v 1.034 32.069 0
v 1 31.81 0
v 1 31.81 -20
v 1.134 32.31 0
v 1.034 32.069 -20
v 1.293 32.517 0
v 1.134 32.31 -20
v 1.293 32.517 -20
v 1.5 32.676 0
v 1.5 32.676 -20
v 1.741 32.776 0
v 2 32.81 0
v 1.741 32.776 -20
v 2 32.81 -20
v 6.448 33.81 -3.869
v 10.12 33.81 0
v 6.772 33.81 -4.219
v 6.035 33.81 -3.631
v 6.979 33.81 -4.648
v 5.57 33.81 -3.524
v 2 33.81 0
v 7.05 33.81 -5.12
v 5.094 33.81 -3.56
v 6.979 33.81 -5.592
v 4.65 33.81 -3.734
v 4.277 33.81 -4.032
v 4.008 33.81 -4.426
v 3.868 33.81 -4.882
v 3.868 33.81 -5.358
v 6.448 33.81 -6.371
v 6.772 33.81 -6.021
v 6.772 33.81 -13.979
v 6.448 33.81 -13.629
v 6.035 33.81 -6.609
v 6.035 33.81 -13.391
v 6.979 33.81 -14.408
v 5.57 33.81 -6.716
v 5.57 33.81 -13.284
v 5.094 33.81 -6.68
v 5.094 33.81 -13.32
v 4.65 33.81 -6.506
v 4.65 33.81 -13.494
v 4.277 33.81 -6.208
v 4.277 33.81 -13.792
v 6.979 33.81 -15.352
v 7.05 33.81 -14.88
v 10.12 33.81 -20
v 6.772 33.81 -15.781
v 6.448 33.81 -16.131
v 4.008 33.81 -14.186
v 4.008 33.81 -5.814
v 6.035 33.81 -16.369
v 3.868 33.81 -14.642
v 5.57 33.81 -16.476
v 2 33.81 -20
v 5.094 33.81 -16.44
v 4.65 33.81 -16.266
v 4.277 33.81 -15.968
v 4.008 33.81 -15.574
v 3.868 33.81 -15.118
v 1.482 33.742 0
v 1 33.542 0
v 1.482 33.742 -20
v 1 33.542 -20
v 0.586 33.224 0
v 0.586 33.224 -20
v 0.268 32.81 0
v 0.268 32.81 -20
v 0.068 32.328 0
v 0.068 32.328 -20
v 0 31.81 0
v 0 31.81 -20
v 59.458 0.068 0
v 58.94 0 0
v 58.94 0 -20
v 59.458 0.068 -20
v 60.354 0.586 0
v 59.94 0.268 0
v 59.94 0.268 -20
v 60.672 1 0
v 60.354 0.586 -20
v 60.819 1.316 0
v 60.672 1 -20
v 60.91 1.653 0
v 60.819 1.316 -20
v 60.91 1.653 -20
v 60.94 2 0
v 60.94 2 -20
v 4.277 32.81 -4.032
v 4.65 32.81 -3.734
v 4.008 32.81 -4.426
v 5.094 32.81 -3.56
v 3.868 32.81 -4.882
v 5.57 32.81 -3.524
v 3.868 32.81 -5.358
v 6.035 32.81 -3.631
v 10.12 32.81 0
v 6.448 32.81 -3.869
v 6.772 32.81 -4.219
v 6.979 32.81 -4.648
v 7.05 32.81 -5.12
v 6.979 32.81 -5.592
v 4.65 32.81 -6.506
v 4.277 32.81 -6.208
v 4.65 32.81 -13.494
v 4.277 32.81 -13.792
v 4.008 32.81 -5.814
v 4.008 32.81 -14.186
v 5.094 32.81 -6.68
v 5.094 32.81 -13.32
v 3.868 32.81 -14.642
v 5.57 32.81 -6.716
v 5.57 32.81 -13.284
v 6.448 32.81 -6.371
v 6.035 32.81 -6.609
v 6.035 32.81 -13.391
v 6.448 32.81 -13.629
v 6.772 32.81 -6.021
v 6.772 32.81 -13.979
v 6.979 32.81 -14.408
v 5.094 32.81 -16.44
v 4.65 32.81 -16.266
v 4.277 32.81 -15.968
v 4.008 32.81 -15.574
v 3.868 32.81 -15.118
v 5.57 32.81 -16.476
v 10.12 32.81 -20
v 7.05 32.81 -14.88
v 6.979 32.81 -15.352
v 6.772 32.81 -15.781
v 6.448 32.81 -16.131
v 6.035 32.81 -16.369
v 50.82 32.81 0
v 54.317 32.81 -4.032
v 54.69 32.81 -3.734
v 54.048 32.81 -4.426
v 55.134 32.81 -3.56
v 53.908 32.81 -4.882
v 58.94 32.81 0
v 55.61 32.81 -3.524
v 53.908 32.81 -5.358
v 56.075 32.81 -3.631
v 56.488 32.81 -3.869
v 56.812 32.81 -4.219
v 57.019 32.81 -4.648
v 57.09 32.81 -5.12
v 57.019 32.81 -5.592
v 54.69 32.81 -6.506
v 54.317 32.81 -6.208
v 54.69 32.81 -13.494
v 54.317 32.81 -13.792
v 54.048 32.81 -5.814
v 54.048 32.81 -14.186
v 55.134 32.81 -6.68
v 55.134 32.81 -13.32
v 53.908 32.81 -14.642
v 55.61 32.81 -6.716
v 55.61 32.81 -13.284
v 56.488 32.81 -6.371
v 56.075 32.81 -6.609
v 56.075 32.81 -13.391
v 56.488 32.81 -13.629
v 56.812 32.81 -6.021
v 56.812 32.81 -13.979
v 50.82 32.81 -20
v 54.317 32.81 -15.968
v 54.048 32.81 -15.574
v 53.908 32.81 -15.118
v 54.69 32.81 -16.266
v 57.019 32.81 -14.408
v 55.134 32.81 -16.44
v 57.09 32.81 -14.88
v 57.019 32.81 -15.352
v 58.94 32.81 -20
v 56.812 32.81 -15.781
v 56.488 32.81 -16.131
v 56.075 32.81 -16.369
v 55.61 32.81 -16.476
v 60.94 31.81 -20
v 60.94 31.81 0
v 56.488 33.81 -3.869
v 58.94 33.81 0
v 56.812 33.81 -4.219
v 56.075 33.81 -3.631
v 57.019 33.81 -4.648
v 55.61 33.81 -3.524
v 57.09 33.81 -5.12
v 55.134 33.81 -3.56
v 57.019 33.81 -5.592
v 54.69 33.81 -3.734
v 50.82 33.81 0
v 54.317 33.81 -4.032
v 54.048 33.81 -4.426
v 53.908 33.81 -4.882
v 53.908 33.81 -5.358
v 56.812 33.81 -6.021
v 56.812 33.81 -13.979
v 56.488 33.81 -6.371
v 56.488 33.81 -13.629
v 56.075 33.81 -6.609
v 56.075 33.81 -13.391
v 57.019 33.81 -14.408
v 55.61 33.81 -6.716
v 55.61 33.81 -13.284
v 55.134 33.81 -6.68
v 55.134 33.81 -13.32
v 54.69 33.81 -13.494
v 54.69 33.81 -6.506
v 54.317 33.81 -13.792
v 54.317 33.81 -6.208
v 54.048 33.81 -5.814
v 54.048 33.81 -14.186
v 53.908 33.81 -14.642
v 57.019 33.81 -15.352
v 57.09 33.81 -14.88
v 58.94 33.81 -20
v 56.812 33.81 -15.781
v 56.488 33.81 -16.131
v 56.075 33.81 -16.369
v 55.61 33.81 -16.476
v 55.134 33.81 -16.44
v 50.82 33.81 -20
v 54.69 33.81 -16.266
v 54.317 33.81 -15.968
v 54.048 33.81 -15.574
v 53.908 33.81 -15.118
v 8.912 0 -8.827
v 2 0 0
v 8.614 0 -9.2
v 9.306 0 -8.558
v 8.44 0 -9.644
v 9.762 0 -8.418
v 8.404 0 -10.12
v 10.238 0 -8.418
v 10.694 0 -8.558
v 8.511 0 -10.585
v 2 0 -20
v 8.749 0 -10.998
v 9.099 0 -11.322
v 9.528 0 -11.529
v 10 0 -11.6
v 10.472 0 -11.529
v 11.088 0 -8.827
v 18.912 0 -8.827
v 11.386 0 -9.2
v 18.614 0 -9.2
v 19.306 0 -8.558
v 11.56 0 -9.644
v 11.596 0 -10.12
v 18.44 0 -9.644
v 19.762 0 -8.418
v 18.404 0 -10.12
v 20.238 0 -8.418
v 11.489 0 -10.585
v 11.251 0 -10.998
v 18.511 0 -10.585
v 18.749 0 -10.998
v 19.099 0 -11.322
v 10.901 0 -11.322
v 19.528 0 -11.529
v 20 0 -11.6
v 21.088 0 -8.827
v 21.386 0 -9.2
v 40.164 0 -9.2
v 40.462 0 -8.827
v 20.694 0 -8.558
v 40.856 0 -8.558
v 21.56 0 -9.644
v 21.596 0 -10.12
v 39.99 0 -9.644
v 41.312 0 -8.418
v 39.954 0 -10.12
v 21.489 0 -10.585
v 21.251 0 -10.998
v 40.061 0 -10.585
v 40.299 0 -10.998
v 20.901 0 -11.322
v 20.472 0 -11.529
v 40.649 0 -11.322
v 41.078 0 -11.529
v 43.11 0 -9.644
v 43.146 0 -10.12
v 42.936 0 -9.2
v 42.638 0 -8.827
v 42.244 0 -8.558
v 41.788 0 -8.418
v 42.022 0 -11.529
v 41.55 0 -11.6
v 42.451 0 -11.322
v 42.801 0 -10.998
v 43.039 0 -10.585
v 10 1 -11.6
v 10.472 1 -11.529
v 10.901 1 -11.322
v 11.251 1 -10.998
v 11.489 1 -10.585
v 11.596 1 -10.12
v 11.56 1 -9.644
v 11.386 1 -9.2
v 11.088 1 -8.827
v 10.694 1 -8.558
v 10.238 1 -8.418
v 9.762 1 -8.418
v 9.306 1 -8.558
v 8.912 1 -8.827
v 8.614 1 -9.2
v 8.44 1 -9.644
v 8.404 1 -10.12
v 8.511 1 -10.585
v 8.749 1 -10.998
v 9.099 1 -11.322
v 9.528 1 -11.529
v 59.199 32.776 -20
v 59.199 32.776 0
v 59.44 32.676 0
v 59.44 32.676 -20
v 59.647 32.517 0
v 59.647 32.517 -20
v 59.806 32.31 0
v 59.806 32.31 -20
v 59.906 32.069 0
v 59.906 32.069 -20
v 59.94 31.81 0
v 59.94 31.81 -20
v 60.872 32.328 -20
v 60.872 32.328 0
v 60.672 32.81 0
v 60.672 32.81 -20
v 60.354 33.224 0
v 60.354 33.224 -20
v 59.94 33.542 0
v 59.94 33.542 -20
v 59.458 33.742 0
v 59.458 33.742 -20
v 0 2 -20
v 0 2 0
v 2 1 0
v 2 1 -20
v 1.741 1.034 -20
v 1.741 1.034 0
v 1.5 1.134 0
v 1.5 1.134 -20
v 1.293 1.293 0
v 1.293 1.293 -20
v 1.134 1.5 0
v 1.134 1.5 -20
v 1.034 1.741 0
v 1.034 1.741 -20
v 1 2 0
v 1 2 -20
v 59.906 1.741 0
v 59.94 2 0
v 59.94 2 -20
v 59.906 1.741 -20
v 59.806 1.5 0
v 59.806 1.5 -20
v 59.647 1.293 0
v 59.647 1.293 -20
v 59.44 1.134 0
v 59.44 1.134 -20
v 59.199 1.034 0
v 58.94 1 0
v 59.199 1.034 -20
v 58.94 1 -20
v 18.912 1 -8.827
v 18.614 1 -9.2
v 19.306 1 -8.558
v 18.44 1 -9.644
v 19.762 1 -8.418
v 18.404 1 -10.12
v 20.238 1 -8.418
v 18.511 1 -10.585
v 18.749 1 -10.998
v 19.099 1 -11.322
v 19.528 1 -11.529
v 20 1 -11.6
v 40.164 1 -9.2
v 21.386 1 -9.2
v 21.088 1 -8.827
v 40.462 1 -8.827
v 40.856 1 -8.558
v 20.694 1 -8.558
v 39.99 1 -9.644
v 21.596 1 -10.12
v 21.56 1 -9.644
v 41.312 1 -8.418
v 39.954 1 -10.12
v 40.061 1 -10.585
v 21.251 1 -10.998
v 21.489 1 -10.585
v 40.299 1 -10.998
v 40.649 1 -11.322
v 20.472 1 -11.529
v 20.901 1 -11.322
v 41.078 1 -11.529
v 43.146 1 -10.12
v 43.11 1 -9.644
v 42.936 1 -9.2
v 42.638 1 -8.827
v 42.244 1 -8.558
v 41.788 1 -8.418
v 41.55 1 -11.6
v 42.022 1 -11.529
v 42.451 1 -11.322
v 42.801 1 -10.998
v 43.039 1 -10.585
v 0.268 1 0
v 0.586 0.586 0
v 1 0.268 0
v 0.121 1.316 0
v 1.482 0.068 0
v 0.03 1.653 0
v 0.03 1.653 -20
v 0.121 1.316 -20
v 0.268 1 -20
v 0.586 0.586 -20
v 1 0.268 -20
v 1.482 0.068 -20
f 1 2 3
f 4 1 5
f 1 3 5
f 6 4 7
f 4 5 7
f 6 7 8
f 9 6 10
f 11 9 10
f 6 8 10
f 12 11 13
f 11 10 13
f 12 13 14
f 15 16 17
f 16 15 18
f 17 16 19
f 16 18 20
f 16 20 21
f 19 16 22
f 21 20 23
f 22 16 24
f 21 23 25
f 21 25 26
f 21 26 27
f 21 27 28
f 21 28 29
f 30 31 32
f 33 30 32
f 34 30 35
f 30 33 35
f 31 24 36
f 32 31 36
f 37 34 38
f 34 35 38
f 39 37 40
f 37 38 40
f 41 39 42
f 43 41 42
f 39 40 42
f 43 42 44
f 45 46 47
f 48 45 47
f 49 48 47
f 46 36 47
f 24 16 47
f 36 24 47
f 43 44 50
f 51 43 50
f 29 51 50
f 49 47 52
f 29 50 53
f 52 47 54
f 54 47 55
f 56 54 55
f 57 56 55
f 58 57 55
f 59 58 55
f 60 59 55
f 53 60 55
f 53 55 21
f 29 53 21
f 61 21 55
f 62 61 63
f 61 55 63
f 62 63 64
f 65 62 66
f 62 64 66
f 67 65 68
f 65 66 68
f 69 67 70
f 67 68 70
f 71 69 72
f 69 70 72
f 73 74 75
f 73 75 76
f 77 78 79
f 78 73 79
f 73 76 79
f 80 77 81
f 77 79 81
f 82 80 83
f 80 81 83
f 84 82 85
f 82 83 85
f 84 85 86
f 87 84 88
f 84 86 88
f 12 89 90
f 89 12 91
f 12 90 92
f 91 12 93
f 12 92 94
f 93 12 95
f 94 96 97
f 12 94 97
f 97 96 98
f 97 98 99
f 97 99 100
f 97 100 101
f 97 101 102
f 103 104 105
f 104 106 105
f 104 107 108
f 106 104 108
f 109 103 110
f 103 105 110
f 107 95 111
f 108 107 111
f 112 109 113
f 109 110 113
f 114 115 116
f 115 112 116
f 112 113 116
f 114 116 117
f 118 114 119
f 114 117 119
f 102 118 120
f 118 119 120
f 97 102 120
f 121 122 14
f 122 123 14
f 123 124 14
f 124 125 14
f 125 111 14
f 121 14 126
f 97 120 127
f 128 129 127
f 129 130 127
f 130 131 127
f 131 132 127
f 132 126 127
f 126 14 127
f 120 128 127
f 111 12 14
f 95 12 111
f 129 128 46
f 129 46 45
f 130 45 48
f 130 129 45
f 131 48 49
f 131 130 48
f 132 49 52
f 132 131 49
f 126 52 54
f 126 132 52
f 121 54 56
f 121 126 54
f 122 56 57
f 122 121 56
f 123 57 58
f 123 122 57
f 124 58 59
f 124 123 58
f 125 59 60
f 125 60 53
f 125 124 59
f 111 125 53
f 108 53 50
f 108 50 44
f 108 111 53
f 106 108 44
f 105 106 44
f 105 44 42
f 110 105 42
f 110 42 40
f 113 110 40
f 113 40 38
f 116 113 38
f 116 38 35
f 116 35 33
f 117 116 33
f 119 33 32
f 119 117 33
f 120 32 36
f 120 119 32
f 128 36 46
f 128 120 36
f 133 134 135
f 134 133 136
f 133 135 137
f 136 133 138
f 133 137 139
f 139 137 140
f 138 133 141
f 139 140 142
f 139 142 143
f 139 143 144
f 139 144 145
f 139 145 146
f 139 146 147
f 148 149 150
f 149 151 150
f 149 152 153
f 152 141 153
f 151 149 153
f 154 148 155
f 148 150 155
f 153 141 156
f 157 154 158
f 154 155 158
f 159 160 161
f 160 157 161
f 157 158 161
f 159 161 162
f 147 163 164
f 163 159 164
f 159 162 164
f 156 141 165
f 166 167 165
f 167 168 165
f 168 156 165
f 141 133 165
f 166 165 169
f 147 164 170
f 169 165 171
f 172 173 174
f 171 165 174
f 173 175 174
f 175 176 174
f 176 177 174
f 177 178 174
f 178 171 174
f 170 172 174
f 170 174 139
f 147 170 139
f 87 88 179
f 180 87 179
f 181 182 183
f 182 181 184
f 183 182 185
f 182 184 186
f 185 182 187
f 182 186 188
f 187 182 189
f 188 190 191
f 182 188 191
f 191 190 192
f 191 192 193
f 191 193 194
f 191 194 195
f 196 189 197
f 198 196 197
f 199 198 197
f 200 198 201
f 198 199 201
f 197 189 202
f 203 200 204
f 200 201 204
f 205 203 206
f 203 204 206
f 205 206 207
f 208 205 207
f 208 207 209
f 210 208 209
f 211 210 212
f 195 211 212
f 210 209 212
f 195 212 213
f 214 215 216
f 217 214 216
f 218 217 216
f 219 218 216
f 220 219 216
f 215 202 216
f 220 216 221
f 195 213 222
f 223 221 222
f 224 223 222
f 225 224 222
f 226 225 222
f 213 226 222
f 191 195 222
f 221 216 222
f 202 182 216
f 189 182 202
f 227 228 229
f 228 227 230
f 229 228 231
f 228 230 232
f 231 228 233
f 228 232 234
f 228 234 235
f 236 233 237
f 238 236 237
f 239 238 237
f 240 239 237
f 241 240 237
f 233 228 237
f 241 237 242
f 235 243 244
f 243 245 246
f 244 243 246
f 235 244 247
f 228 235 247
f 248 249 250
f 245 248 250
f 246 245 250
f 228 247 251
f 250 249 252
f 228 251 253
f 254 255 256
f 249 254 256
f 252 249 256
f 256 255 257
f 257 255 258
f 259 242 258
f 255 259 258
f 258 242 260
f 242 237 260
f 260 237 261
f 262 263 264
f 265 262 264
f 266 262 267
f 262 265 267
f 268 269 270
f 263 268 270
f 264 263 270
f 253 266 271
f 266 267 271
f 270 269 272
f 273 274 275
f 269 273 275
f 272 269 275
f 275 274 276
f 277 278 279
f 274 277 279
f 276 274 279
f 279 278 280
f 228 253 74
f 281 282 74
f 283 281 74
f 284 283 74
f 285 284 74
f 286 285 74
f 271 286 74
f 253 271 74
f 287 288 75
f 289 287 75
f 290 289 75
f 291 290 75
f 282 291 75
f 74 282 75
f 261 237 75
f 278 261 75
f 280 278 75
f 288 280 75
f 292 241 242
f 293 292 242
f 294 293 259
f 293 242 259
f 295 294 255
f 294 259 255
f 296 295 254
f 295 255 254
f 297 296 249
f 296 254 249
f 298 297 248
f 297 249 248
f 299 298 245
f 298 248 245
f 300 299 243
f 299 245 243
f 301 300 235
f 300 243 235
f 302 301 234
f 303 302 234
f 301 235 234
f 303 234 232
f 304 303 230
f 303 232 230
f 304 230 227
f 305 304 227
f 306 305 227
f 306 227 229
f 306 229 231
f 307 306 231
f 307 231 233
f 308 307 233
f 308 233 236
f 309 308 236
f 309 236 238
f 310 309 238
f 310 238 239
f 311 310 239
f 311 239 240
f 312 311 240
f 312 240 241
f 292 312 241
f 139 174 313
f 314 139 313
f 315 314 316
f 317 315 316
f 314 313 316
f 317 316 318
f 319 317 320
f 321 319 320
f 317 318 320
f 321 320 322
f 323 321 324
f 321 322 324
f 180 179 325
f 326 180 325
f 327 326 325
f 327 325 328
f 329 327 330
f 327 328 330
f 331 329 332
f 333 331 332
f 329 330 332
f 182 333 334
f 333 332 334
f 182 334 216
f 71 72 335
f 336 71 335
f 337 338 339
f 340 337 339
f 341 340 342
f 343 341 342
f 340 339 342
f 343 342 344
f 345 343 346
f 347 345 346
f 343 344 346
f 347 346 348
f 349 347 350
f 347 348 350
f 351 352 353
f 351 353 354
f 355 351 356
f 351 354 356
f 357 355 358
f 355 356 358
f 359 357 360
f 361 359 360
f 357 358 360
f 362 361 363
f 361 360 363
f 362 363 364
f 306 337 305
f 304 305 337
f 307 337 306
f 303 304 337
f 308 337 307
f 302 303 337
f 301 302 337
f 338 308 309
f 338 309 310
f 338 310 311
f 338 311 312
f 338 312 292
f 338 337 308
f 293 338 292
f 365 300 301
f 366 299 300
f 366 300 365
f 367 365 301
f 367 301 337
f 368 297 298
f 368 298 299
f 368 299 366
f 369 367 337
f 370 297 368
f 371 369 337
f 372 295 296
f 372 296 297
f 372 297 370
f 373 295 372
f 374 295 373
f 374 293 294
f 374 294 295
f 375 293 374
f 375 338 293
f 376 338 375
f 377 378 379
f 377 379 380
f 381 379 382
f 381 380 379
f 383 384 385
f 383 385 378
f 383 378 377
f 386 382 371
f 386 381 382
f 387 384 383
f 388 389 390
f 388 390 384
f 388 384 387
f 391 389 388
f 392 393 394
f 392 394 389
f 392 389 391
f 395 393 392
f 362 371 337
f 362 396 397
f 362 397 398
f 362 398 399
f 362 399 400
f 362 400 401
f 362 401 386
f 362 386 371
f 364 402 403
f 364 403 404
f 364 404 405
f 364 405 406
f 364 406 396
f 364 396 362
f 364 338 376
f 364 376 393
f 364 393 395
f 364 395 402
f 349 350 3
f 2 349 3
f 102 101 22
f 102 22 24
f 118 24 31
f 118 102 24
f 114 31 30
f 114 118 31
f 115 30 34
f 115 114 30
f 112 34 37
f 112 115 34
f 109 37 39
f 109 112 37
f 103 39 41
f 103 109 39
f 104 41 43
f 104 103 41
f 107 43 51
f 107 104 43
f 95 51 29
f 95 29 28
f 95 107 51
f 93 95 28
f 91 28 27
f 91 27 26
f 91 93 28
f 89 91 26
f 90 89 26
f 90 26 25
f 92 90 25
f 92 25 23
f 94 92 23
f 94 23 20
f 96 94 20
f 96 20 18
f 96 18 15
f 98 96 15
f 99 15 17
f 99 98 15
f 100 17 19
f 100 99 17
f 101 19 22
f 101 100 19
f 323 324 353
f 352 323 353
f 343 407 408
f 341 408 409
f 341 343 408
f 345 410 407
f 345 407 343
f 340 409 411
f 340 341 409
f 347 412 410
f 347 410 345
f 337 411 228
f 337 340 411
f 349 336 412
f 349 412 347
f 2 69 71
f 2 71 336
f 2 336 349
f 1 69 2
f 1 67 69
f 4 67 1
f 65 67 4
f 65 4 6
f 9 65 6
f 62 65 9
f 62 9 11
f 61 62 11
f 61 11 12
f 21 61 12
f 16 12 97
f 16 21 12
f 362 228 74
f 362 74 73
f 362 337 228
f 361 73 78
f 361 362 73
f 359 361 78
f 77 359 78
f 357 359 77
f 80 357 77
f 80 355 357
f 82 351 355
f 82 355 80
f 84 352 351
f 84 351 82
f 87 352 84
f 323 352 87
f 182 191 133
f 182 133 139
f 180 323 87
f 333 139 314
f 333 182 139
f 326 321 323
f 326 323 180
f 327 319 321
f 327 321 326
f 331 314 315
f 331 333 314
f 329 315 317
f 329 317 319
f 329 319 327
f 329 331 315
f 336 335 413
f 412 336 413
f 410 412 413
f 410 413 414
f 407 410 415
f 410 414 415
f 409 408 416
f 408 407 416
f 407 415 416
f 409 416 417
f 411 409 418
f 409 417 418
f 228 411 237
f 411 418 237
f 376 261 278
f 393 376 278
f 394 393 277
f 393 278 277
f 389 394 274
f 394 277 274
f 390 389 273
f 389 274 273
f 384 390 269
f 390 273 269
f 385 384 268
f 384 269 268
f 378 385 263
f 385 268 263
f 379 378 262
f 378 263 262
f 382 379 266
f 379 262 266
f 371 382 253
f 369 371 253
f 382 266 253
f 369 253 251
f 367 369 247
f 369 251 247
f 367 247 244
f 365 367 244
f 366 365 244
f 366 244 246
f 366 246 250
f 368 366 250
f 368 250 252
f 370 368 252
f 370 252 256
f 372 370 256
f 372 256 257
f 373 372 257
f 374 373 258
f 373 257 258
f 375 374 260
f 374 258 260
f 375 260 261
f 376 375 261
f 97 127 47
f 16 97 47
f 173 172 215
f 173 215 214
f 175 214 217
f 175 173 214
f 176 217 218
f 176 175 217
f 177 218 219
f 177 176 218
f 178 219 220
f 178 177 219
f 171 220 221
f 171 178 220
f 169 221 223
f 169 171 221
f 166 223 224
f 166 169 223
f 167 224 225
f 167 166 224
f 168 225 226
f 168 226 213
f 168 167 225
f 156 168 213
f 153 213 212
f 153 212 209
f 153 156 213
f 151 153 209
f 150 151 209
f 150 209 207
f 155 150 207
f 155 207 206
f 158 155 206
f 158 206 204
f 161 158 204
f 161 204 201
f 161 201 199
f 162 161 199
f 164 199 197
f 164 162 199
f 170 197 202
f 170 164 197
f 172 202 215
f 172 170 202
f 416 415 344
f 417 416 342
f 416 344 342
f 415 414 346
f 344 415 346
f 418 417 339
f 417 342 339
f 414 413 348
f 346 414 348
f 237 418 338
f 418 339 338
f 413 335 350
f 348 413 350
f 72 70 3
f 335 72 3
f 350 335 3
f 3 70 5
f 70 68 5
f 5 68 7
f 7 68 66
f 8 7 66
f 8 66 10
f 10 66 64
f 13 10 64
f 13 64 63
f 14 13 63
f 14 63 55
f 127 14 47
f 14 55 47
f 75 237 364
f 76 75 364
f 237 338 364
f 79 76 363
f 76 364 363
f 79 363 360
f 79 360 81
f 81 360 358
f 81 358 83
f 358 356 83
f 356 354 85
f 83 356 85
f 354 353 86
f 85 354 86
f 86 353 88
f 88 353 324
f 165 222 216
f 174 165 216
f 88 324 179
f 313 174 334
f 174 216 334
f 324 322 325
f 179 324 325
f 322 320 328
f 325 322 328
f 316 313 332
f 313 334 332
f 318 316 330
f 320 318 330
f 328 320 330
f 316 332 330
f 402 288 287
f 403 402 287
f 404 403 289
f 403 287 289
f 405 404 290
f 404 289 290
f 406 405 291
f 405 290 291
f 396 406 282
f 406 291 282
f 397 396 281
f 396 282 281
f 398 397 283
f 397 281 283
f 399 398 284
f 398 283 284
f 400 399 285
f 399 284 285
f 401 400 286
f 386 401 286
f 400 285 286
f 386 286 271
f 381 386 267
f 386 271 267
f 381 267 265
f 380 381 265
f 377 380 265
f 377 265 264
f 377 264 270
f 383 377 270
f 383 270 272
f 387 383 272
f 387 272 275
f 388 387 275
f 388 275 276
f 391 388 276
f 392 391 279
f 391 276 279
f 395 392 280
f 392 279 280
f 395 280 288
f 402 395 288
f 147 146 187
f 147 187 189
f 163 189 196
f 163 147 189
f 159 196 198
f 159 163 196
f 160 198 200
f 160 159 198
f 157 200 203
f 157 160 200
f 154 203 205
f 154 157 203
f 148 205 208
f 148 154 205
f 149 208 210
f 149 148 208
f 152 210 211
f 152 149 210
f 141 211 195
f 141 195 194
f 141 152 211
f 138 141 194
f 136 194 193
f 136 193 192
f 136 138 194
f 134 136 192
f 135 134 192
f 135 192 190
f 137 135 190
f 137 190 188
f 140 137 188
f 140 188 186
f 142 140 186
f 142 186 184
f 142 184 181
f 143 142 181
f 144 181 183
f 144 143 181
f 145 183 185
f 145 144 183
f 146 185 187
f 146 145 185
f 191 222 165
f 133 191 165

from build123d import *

# Parameters (mm, degrees)
SKETCH_2_W                  = 60.94
SKETCH_2_H                  = 20
EXTRUDE_1_DEPTH             = 1
SKETCH_3_W                  = 1
SKETCH_3_H                  = 20
EXTRUDE_2_DEPTH             = 32.81
SKETCH_4_W                  = 1
SKETCH_4_H                  = 20
EXTRUDE_3_DEPTH             = 32.81
SKETCH_9_W                  = 20
SKETCH_9_H                  = 1
EXTRUDE_8_DEPTH             = 9.12
SKETCH_10_W                 = 20
SKETCH_10_H                 = 1
EXTRUDE_9_DEPTH             = 9.12
SKETCH_13_R                 = 1.6
CUT_EXTRUDE_2_DEPTH         = 1
SKETCH_14_R                 = 1.6
CUT_EXTRUDE_3_DEPTH         = 1
SKETCH_15_R                 = 1.6
CUT_EXTRUDE_4_DEPTH         = 1
SKETCH_16_R                 = 1.6
CUT_EXTRUDE_5_DEPTH         = 1
SKETCH_17_R                 = 1.6
CUT_EXTRUDE_6_DEPTH         = 1
SKETCH_18_R                 = 1.6
CUT_EXTRUDE_7_DEPTH         = 1
SKETCH_19_R                 = 1.6
CUT_EXTRUDE_8_DEPTH         = 1
SHEET_START                 = 1
SHEET_METAL_1_OUTLINE_W     = 10.12
SHEET_METAL_1_OUTLINE_H     = 20
SHEET_METAL_1_OUTLINE_R     = 1.6
SHEET_METAL_1_DEPTH         = 32.81
SHEET_METAL_1_2_OUTLINE_W   = 40.64238898
SHEET_METAL_1_2_OUTLINE_H   = 20
SHEET_METAL_1_2_OUTLINE_R   = 1.6
SHEET_METAL_1_2_DEPTH       = 1
SHEET_START_2               = -20
SHEET_METAL_1_3_DEPTH       = 20
SHEET_START_3               = -13.2799999
SHEET_METAL_1_3_2_DEPTH     = 6.5599998
SHEET_METAL_1_3_3_DEPTH     = 3.5199999
SHEET_START_4               = -3.5199999
SHEET_METAL_1_3_4_DEPTH     = 3.5199999
SHEET_START_5               = -16.4800001
SHEET_METAL_1_3_5_DEPTH     = 12.9600002
SHEET_START_6               = 32.81
SHEET_METAL_1_3_6_OUTLINE_R = 1.6
SHEET_METAL_1_3_6_DEPTH     = 1


with BuildPart() as part:
    # Sketch 2 → ﾎﾞｽ - 押し出し1 (new body)
    with BuildSketch(Plane(origin=(0, 0, 0), x_dir=(1, 0, 0), z_dir=(0, 1, 0))):
        with Locations((30.47, 10)):
            Rectangle(SKETCH_2_W, SKETCH_2_H)
    extrude(amount=EXTRUDE_1_DEPTH)

    # ｽｹｯﾁ3 → ﾎﾞｽ - 押し出し2 (add)
    with BuildSketch(Plane(origin=(0, 1, 0), x_dir=(1, 0, 0), z_dir=(0, 1, 0))):
        with Locations((60.44, 10)):
            Rectangle(SKETCH_3_W, SKETCH_3_H)
    extrude(amount=EXTRUDE_2_DEPTH)

    # ｽｹｯﾁ4 → ﾎﾞｽ - 押し出し3 (add)
    with BuildSketch(Plane(origin=(0, 1, 0), x_dir=(1, 0, 0), z_dir=(0, 1, 0))):
        with Locations((0.5, 10)):
            Rectangle(SKETCH_4_W, SKETCH_4_H)
    extrude(amount=EXTRUDE_3_DEPTH)

    # ｽｹｯﾁ9 → ﾎﾞｽ - 押し出し8 (add)
    with BuildSketch(Plane.ZY.offset(-59.94)):
        with Locations((-10, 33.31)):
            Rectangle(SKETCH_9_W, SKETCH_9_H)
    extrude(amount=EXTRUDE_8_DEPTH)

    # ｽｹｯﾁ10 → ﾎﾞｽ - 押し出し9 (add)
    with BuildSketch(Plane(origin=(1, 0, 0), x_dir=(0, 0, -1), z_dir=(1, 0, 0))):
        with Locations((10, 33.31)):
            Rectangle(SKETCH_10_W, SKETCH_10_H)
    extrude(amount=EXTRUDE_9_DEPTH)

    # ｽｹｯﾁ13 → ｶｯﾄ - 押し出し2 (cut)
    with BuildSketch(Plane(origin=(0, 33.81, 0), x_dir=(1, 0, 0), z_dir=(0, 1, 0))):
        with Locations(Location((55.49, 5.12, 0), (0, 0, 270))):
            Circle(SKETCH_13_R)
    extrude(amount=-CUT_EXTRUDE_2_DEPTH, mode=Mode.SUBTRACT)

    # ｽｹｯﾁ14 → ｶｯﾄ - 押し出し3 (cut)
    with BuildSketch(Plane(origin=(0, 33.81, 0), x_dir=(1, 0, 0), z_dir=(0, 1, 0))):
        with Locations(Location((55.49, 14.88, 0), (0, 0, 270))):
            Circle(SKETCH_14_R)
    extrude(amount=-CUT_EXTRUDE_3_DEPTH, mode=Mode.SUBTRACT)

    # ｽｹｯﾁ15 → ｶｯﾄ - 押し出し4 (cut)
    with BuildSketch(Plane(origin=(0, 33.81, 0), x_dir=(1, 0, 0), z_dir=(0, 1, 0))):
        with Locations(Location((5.45, 5.12, 0), (0, 0, 270))):
            Circle(SKETCH_15_R)
    extrude(amount=-CUT_EXTRUDE_4_DEPTH, mode=Mode.SUBTRACT)

    # ｽｹｯﾁ16 → ｶｯﾄ - 押し出し5 (cut)
    with BuildSketch(Plane(origin=(0, 33.81, 0), x_dir=(1, 0, 0), z_dir=(0, 1, 0))):
        with Locations(Location((5.45, 14.88, 0), (0, 0, 270))):
            Circle(SKETCH_16_R)
    extrude(amount=-CUT_EXTRUDE_5_DEPTH, mode=Mode.SUBTRACT)

    # ｽｹｯﾁ17 → ｶｯﾄ - 押し出し6 (cut)
    with BuildSketch(Plane(origin=(0, 0, 0), x_dir=(-1, 0, 0), z_dir=(0, -1, 0))):
        with Locations(Location((-41.55, 10, 0), (0, 0, 90))):
            Circle(SKETCH_17_R)
    extrude(amount=-CUT_EXTRUDE_6_DEPTH, mode=Mode.SUBTRACT)

    # ｽｹｯﾁ18 → ｶｯﾄ - 押し出し7 (cut)
    with BuildSketch(Plane(origin=(0, 0, 0), x_dir=(-1, 0, 0), z_dir=(0, -1, 0))):
        with Locations(Location((-10, 10, 0), (0, 0, 90))):
            Circle(SKETCH_18_R)
    extrude(amount=-CUT_EXTRUDE_7_DEPTH, mode=Mode.SUBTRACT)

    # ｽｹｯﾁ19 → ｶｯﾄ - 押し出し8 (cut)
    with BuildSketch(Plane(origin=(0, 0, 0), x_dir=(-1, 0, 0), z_dir=(0, -1, 0))):
        with Locations(Location((-20, 10, 0), (0, 0, 90))):
            Circle(SKETCH_19_R)
    extrude(amount=-CUT_EXTRUDE_8_DEPTH, mode=Mode.SUBTRACT)

    # Sheet Metal 1: read off the stored shape, not the designer's step
    # Sheet Metal 1 outline → Sheet Metal 1 (cut)
    # profile 1 of 2: a face of its own
    with BuildSketch(Plane(origin=(0, 0, 0), x_dir=(1, 0, 0), z_dir=(0, 1, 0)).offset(SHEET_START)):
        with Locations((55.88, 10)):
            Rectangle(SHEET_METAL_1_OUTLINE_W, SHEET_METAL_1_OUTLINE_H)
        with Locations((55.49, 14.88)):
            Circle(SHEET_METAL_1_OUTLINE_R, mode=Mode.SUBTRACT)
        with Locations((55.49, 5.12)):
            Circle(SHEET_METAL_1_OUTLINE_R, mode=Mode.SUBTRACT)
    # profile 2 of 2: a face of its own
    with BuildSketch(Plane(origin=(0, 0, 0), x_dir=(1, 0, 0), z_dir=(0, 1, 0)).offset(SHEET_START)):
        with Locations((5.06, 10)):
            Rectangle(SHEET_METAL_1_OUTLINE_W, SHEET_METAL_1_OUTLINE_H)
        with Locations((5.45, 5.12)):
            Circle(SHEET_METAL_1_OUTLINE_R, mode=Mode.SUBTRACT)
        with Locations((5.45, 14.88)):
            Circle(SHEET_METAL_1_OUTLINE_R, mode=Mode.SUBTRACT)
    extrude(amount=SHEET_METAL_1_DEPTH, mode=Mode.SUBTRACT)

    # Sheet Metal 1 2 outline → Sheet Metal 1 2 (add)
    # profile 1 of 2: a face of its own
    with BuildSketch(Plane(origin=(0, 0, 0), x_dir=(1, 0, 0), z_dir=(0, 1, 0))):
        with Locations((81.26119449, 10)):
            Rectangle(SHEET_METAL_1_2_OUTLINE_W, SHEET_METAL_1_2_OUTLINE_H)
        with Locations((96.91238898, 5.12)):
            Circle(SHEET_METAL_1_2_OUTLINE_R, mode=Mode.SUBTRACT)
        with Locations((96.91238898, 14.88)):
            Circle(SHEET_METAL_1_2_OUTLINE_R, mode=Mode.SUBTRACT)
    # profile 2 of 2: a face of its own
    with BuildSketch(Plane(origin=(0, 0, 0), x_dir=(1, 0, 0), z_dir=(0, 1, 0))):
        with Locations((-20.32119449, 10)):
            Rectangle(SHEET_METAL_1_2_OUTLINE_W, SHEET_METAL_1_2_OUTLINE_H)
        with Locations((-35.97238898, 5.12)):
            Circle(SHEET_METAL_1_2_OUTLINE_R, mode=Mode.SUBTRACT)
        with Locations((-35.97238898, 14.88)):
            Circle(SHEET_METAL_1_2_OUTLINE_R, mode=Mode.SUBTRACT)
    extrude(amount=SHEET_METAL_1_2_DEPTH)

    # Sheet Metal 1 3: read off the stored shape, not the designer's step
    # Sheet Metal 1 3 outline → Sheet Metal 1 3 (cut)
    with BuildSketch(Plane.XY.offset(SHEET_START_2)):
        with BuildLine():
            ThreePointArc((2, 0), (1, 0.267949193), (0.267949193, 1))
            Line((0.267949193, 1), (-40.64238898, 1))
            Line((-40.64238898, 1), (-40.64238898, 0))
            Line((-40.64238898, 0), (2, 0))
        make_face()
        with BuildLine():
            Line((101.58238898, 1), (60.672050807, 1))
            ThreePointArc((60.672050807, 1), (59.94, 0.267949193), (58.94, 0))
            Line((58.94, 0), (101.58238898, 0))
            Line((101.58238898, 0), (101.58238898, 1))
        make_face()
    extrude(amount=SHEET_METAL_1_3_DEPTH, mode=Mode.SUBTRACT)

    # Sheet Metal 1 3 2 outline → Sheet Metal 1 3 2 (add)
    with BuildSketch(Plane.XY.offset(SHEET_START_3)):
        with BuildLine():
            Line((2, 32.81), (10.12, 32.81))
            Line((10.12, 32.81), (10.12, 33.81))
            Line((10.12, 33.81), (2, 33.81))
            ThreePointArc((2, 33.81), (0.585786438, 33.224213562), (0, 31.81))
            Line((0, 31.81), (0, 2))
            ThreePointArc((0, 2), (0.068148348, 1.48236191), (0.267949193, 1))
            Line((0.267949193, 1), (2, 1))
            ThreePointArc((2, 1), (1.292893219, 1.292893219), (1, 2))
            Line((1, 2), (1, 31.81))
            ThreePointArc((1, 31.81), (1.292893219, 32.517106781), (2, 32.81))
        make_face()
        with BuildLine():
            Line((58.94, 33.81), (50.82, 33.81))
            Line((50.82, 33.81), (50.82, 32.81))
            Line((50.82, 32.81), (58.94, 32.81))
            ThreePointArc((58.94, 32.81), (59.647106781, 32.517106781), (59.94, 31.81))
            Line((59.94, 31.81), (59.94, 2))
            ThreePointArc((59.94, 2), (59.647106781, 1.292893219), (58.94, 1))
            Line((58.94, 1), (60.672050807, 1))
            ThreePointArc((60.672050807, 1), (60.871851652, 1.48236191), (60.94, 2))
            Line((60.94, 2), (60.94, 31.81))
            ThreePointArc((60.94, 31.81), (60.354213562, 33.224213562), (58.94, 33.81))
        make_face()
    extrude(amount=SHEET_METAL_1_3_2_DEPTH)

    # Sheet Metal 1 3 3 outline → Sheet Metal 1 3 3 (add)
    with BuildSketch(Plane.XY.offset(SHEET_START_2)):
        with BuildLine():
            Line((2, 32.81), (10.12, 32.81))
            Line((10.12, 32.81), (10.12, 33.81))
            Line((10.12, 33.81), (2, 33.81))
            ThreePointArc((2, 33.81), (0.585786438, 33.224213562), (0, 31.81))
            Line((0, 31.81), (0, 2))
            ThreePointArc((0, 2), (0.068148348, 1.48236191), (0.267949193, 1))
            Line((0.267949193, 1), (2, 1))
            ThreePointArc((2, 1), (1.292893219, 1.292893219), (1, 2))
            Line((1, 2), (1, 31.81))
            ThreePointArc((1, 31.81), (1.292893219, 32.517106781), (2, 32.81))
        make_face()
        with BuildLine():
            Line((58.94, 33.81), (50.82, 33.81))
            Line((50.82, 33.81), (50.82, 32.81))
            Line((50.82, 32.81), (58.94, 32.81))
            ThreePointArc((58.94, 32.81), (59.647106781, 32.517106781), (59.94, 31.81))
            Line((59.94, 31.81), (59.94, 2))
            ThreePointArc((59.94, 2), (59.647106781, 1.292893219), (58.94, 1))
            Line((58.94, 1), (60.672050807, 1))
            ThreePointArc((60.672050807, 1), (60.871851652, 1.48236191), (60.94, 2))
            Line((60.94, 2), (60.94, 31.81))
            ThreePointArc((60.94, 31.81), (60.354213562, 33.224213562), (58.94, 33.81))
        make_face()
    extrude(amount=SHEET_METAL_1_3_3_DEPTH)

    # Sheet Metal 1 3 4 outline → Sheet Metal 1 3 4 (add)
    with BuildSketch(Plane.XY.offset(SHEET_START_4)):
        with BuildLine():
            Line((2, 32.81), (10.12, 32.81))
            Line((10.12, 32.81), (10.12, 33.81))
            Line((10.12, 33.81), (2, 33.81))
            ThreePointArc((2, 33.81), (0.585786438, 33.224213562), (0, 31.81))
            Line((0, 31.81), (0, 2))
            ThreePointArc((0, 2), (0.068148348, 1.48236191), (0.267949193, 1))
            Line((0.267949193, 1), (2, 1))
            ThreePointArc((2, 1), (1.292893219, 1.292893219), (1, 2))
            Line((1, 2), (1, 31.81))
            ThreePointArc((1, 31.81), (1.292893219, 32.517106781), (2, 32.81))
        make_face()
        with BuildLine():
            Line((58.94, 33.81), (50.82, 33.81))
            Line((50.82, 33.81), (50.82, 32.81))
            Line((50.82, 32.81), (58.94, 32.81))
            ThreePointArc((58.94, 32.81), (59.647106781, 32.517106781), (59.94, 31.81))
            Line((59.94, 31.81), (59.94, 2))
            ThreePointArc((59.94, 2), (59.647106781, 1.292893219), (58.94, 1))
            Line((58.94, 1), (60.672050807, 1))
            ThreePointArc((60.672050807, 1), (60.871851652, 1.48236191), (60.94, 2))
            Line((60.94, 2), (60.94, 31.81))
            ThreePointArc((60.94, 31.81), (60.354213562, 33.224213562), (58.94, 33.81))
        make_face()
    extrude(amount=SHEET_METAL_1_3_4_DEPTH)

    # Sheet Metal 1 3 5 outline → Sheet Metal 1 3 5 (add)
    with BuildSketch(Plane.XY.offset(SHEET_START_5)):
        with BuildLine():
            Line((2, 32.81), (10.12, 32.81))
            Line((10.12, 32.81), (10.12, 33.81))
            Line((10.12, 33.81), (2, 33.81))
            ThreePointArc((2, 33.81), (0.585786438, 33.224213562), (0, 31.81))
            Line((0, 31.81), (0, 2))
            ThreePointArc((0, 2), (0.068148348, 1.48236191), (0.267949193, 1))
            Line((0.267949193, 1), (2, 1))
            ThreePointArc((2, 1), (1.292893219, 1.292893219), (1, 2))
            Line((1, 2), (1, 31.81))
            ThreePointArc((1, 31.81), (1.292893219, 32.517106781), (2, 32.81))
        make_face()
        with BuildLine():
            ThreePointArc((59.94, 2), (59.647106781, 1.292893219), (58.94, 1))
            Line((58.94, 1), (60.672050807, 1))
            ThreePointArc((60.672050807, 1), (60.871851652, 1.48236191), (60.94, 2))
            Line((60.94, 2), (60.94, 31.81))
            ThreePointArc((60.94, 31.81), (60.354213562, 33.224213562), (58.94, 33.81))
            Line((58.94, 33.81), (50.82, 33.81))
            Line((50.82, 33.81), (50.82, 32.81))
            Line((50.82, 32.81), (58.94, 32.81))
            ThreePointArc((58.94, 32.81), (59.647106781, 32.517106781), (59.94, 31.81))
            Line((59.94, 31.81), (59.94, 2))
        make_face()
    extrude(amount=SHEET_METAL_1_3_5_DEPTH)

    # Sheet Metal 1 3 6 outline → Sheet Metal 1 3 6 (cut)
    with BuildSketch(Plane(origin=(0, 0, 0), x_dir=(1, 0, 0), z_dir=(0, 1, 0)).offset(SHEET_START_6)):
        with Locations((5.45, 5.12)):
            Circle(SHEET_METAL_1_3_6_OUTLINE_R)
        with Locations((5.45, 14.88)):
            Circle(SHEET_METAL_1_3_6_OUTLINE_R)
        with Locations((55.49, 5.12)):
            Circle(SHEET_METAL_1_3_6_OUTLINE_R)
        with Locations((55.49, 14.88)):
            Circle(SHEET_METAL_1_3_6_OUTLINE_R)
    extrude(amount=SHEET_METAL_1_3_6_DEPTH, mode=Mode.SUBTRACT)


solid = part.part
